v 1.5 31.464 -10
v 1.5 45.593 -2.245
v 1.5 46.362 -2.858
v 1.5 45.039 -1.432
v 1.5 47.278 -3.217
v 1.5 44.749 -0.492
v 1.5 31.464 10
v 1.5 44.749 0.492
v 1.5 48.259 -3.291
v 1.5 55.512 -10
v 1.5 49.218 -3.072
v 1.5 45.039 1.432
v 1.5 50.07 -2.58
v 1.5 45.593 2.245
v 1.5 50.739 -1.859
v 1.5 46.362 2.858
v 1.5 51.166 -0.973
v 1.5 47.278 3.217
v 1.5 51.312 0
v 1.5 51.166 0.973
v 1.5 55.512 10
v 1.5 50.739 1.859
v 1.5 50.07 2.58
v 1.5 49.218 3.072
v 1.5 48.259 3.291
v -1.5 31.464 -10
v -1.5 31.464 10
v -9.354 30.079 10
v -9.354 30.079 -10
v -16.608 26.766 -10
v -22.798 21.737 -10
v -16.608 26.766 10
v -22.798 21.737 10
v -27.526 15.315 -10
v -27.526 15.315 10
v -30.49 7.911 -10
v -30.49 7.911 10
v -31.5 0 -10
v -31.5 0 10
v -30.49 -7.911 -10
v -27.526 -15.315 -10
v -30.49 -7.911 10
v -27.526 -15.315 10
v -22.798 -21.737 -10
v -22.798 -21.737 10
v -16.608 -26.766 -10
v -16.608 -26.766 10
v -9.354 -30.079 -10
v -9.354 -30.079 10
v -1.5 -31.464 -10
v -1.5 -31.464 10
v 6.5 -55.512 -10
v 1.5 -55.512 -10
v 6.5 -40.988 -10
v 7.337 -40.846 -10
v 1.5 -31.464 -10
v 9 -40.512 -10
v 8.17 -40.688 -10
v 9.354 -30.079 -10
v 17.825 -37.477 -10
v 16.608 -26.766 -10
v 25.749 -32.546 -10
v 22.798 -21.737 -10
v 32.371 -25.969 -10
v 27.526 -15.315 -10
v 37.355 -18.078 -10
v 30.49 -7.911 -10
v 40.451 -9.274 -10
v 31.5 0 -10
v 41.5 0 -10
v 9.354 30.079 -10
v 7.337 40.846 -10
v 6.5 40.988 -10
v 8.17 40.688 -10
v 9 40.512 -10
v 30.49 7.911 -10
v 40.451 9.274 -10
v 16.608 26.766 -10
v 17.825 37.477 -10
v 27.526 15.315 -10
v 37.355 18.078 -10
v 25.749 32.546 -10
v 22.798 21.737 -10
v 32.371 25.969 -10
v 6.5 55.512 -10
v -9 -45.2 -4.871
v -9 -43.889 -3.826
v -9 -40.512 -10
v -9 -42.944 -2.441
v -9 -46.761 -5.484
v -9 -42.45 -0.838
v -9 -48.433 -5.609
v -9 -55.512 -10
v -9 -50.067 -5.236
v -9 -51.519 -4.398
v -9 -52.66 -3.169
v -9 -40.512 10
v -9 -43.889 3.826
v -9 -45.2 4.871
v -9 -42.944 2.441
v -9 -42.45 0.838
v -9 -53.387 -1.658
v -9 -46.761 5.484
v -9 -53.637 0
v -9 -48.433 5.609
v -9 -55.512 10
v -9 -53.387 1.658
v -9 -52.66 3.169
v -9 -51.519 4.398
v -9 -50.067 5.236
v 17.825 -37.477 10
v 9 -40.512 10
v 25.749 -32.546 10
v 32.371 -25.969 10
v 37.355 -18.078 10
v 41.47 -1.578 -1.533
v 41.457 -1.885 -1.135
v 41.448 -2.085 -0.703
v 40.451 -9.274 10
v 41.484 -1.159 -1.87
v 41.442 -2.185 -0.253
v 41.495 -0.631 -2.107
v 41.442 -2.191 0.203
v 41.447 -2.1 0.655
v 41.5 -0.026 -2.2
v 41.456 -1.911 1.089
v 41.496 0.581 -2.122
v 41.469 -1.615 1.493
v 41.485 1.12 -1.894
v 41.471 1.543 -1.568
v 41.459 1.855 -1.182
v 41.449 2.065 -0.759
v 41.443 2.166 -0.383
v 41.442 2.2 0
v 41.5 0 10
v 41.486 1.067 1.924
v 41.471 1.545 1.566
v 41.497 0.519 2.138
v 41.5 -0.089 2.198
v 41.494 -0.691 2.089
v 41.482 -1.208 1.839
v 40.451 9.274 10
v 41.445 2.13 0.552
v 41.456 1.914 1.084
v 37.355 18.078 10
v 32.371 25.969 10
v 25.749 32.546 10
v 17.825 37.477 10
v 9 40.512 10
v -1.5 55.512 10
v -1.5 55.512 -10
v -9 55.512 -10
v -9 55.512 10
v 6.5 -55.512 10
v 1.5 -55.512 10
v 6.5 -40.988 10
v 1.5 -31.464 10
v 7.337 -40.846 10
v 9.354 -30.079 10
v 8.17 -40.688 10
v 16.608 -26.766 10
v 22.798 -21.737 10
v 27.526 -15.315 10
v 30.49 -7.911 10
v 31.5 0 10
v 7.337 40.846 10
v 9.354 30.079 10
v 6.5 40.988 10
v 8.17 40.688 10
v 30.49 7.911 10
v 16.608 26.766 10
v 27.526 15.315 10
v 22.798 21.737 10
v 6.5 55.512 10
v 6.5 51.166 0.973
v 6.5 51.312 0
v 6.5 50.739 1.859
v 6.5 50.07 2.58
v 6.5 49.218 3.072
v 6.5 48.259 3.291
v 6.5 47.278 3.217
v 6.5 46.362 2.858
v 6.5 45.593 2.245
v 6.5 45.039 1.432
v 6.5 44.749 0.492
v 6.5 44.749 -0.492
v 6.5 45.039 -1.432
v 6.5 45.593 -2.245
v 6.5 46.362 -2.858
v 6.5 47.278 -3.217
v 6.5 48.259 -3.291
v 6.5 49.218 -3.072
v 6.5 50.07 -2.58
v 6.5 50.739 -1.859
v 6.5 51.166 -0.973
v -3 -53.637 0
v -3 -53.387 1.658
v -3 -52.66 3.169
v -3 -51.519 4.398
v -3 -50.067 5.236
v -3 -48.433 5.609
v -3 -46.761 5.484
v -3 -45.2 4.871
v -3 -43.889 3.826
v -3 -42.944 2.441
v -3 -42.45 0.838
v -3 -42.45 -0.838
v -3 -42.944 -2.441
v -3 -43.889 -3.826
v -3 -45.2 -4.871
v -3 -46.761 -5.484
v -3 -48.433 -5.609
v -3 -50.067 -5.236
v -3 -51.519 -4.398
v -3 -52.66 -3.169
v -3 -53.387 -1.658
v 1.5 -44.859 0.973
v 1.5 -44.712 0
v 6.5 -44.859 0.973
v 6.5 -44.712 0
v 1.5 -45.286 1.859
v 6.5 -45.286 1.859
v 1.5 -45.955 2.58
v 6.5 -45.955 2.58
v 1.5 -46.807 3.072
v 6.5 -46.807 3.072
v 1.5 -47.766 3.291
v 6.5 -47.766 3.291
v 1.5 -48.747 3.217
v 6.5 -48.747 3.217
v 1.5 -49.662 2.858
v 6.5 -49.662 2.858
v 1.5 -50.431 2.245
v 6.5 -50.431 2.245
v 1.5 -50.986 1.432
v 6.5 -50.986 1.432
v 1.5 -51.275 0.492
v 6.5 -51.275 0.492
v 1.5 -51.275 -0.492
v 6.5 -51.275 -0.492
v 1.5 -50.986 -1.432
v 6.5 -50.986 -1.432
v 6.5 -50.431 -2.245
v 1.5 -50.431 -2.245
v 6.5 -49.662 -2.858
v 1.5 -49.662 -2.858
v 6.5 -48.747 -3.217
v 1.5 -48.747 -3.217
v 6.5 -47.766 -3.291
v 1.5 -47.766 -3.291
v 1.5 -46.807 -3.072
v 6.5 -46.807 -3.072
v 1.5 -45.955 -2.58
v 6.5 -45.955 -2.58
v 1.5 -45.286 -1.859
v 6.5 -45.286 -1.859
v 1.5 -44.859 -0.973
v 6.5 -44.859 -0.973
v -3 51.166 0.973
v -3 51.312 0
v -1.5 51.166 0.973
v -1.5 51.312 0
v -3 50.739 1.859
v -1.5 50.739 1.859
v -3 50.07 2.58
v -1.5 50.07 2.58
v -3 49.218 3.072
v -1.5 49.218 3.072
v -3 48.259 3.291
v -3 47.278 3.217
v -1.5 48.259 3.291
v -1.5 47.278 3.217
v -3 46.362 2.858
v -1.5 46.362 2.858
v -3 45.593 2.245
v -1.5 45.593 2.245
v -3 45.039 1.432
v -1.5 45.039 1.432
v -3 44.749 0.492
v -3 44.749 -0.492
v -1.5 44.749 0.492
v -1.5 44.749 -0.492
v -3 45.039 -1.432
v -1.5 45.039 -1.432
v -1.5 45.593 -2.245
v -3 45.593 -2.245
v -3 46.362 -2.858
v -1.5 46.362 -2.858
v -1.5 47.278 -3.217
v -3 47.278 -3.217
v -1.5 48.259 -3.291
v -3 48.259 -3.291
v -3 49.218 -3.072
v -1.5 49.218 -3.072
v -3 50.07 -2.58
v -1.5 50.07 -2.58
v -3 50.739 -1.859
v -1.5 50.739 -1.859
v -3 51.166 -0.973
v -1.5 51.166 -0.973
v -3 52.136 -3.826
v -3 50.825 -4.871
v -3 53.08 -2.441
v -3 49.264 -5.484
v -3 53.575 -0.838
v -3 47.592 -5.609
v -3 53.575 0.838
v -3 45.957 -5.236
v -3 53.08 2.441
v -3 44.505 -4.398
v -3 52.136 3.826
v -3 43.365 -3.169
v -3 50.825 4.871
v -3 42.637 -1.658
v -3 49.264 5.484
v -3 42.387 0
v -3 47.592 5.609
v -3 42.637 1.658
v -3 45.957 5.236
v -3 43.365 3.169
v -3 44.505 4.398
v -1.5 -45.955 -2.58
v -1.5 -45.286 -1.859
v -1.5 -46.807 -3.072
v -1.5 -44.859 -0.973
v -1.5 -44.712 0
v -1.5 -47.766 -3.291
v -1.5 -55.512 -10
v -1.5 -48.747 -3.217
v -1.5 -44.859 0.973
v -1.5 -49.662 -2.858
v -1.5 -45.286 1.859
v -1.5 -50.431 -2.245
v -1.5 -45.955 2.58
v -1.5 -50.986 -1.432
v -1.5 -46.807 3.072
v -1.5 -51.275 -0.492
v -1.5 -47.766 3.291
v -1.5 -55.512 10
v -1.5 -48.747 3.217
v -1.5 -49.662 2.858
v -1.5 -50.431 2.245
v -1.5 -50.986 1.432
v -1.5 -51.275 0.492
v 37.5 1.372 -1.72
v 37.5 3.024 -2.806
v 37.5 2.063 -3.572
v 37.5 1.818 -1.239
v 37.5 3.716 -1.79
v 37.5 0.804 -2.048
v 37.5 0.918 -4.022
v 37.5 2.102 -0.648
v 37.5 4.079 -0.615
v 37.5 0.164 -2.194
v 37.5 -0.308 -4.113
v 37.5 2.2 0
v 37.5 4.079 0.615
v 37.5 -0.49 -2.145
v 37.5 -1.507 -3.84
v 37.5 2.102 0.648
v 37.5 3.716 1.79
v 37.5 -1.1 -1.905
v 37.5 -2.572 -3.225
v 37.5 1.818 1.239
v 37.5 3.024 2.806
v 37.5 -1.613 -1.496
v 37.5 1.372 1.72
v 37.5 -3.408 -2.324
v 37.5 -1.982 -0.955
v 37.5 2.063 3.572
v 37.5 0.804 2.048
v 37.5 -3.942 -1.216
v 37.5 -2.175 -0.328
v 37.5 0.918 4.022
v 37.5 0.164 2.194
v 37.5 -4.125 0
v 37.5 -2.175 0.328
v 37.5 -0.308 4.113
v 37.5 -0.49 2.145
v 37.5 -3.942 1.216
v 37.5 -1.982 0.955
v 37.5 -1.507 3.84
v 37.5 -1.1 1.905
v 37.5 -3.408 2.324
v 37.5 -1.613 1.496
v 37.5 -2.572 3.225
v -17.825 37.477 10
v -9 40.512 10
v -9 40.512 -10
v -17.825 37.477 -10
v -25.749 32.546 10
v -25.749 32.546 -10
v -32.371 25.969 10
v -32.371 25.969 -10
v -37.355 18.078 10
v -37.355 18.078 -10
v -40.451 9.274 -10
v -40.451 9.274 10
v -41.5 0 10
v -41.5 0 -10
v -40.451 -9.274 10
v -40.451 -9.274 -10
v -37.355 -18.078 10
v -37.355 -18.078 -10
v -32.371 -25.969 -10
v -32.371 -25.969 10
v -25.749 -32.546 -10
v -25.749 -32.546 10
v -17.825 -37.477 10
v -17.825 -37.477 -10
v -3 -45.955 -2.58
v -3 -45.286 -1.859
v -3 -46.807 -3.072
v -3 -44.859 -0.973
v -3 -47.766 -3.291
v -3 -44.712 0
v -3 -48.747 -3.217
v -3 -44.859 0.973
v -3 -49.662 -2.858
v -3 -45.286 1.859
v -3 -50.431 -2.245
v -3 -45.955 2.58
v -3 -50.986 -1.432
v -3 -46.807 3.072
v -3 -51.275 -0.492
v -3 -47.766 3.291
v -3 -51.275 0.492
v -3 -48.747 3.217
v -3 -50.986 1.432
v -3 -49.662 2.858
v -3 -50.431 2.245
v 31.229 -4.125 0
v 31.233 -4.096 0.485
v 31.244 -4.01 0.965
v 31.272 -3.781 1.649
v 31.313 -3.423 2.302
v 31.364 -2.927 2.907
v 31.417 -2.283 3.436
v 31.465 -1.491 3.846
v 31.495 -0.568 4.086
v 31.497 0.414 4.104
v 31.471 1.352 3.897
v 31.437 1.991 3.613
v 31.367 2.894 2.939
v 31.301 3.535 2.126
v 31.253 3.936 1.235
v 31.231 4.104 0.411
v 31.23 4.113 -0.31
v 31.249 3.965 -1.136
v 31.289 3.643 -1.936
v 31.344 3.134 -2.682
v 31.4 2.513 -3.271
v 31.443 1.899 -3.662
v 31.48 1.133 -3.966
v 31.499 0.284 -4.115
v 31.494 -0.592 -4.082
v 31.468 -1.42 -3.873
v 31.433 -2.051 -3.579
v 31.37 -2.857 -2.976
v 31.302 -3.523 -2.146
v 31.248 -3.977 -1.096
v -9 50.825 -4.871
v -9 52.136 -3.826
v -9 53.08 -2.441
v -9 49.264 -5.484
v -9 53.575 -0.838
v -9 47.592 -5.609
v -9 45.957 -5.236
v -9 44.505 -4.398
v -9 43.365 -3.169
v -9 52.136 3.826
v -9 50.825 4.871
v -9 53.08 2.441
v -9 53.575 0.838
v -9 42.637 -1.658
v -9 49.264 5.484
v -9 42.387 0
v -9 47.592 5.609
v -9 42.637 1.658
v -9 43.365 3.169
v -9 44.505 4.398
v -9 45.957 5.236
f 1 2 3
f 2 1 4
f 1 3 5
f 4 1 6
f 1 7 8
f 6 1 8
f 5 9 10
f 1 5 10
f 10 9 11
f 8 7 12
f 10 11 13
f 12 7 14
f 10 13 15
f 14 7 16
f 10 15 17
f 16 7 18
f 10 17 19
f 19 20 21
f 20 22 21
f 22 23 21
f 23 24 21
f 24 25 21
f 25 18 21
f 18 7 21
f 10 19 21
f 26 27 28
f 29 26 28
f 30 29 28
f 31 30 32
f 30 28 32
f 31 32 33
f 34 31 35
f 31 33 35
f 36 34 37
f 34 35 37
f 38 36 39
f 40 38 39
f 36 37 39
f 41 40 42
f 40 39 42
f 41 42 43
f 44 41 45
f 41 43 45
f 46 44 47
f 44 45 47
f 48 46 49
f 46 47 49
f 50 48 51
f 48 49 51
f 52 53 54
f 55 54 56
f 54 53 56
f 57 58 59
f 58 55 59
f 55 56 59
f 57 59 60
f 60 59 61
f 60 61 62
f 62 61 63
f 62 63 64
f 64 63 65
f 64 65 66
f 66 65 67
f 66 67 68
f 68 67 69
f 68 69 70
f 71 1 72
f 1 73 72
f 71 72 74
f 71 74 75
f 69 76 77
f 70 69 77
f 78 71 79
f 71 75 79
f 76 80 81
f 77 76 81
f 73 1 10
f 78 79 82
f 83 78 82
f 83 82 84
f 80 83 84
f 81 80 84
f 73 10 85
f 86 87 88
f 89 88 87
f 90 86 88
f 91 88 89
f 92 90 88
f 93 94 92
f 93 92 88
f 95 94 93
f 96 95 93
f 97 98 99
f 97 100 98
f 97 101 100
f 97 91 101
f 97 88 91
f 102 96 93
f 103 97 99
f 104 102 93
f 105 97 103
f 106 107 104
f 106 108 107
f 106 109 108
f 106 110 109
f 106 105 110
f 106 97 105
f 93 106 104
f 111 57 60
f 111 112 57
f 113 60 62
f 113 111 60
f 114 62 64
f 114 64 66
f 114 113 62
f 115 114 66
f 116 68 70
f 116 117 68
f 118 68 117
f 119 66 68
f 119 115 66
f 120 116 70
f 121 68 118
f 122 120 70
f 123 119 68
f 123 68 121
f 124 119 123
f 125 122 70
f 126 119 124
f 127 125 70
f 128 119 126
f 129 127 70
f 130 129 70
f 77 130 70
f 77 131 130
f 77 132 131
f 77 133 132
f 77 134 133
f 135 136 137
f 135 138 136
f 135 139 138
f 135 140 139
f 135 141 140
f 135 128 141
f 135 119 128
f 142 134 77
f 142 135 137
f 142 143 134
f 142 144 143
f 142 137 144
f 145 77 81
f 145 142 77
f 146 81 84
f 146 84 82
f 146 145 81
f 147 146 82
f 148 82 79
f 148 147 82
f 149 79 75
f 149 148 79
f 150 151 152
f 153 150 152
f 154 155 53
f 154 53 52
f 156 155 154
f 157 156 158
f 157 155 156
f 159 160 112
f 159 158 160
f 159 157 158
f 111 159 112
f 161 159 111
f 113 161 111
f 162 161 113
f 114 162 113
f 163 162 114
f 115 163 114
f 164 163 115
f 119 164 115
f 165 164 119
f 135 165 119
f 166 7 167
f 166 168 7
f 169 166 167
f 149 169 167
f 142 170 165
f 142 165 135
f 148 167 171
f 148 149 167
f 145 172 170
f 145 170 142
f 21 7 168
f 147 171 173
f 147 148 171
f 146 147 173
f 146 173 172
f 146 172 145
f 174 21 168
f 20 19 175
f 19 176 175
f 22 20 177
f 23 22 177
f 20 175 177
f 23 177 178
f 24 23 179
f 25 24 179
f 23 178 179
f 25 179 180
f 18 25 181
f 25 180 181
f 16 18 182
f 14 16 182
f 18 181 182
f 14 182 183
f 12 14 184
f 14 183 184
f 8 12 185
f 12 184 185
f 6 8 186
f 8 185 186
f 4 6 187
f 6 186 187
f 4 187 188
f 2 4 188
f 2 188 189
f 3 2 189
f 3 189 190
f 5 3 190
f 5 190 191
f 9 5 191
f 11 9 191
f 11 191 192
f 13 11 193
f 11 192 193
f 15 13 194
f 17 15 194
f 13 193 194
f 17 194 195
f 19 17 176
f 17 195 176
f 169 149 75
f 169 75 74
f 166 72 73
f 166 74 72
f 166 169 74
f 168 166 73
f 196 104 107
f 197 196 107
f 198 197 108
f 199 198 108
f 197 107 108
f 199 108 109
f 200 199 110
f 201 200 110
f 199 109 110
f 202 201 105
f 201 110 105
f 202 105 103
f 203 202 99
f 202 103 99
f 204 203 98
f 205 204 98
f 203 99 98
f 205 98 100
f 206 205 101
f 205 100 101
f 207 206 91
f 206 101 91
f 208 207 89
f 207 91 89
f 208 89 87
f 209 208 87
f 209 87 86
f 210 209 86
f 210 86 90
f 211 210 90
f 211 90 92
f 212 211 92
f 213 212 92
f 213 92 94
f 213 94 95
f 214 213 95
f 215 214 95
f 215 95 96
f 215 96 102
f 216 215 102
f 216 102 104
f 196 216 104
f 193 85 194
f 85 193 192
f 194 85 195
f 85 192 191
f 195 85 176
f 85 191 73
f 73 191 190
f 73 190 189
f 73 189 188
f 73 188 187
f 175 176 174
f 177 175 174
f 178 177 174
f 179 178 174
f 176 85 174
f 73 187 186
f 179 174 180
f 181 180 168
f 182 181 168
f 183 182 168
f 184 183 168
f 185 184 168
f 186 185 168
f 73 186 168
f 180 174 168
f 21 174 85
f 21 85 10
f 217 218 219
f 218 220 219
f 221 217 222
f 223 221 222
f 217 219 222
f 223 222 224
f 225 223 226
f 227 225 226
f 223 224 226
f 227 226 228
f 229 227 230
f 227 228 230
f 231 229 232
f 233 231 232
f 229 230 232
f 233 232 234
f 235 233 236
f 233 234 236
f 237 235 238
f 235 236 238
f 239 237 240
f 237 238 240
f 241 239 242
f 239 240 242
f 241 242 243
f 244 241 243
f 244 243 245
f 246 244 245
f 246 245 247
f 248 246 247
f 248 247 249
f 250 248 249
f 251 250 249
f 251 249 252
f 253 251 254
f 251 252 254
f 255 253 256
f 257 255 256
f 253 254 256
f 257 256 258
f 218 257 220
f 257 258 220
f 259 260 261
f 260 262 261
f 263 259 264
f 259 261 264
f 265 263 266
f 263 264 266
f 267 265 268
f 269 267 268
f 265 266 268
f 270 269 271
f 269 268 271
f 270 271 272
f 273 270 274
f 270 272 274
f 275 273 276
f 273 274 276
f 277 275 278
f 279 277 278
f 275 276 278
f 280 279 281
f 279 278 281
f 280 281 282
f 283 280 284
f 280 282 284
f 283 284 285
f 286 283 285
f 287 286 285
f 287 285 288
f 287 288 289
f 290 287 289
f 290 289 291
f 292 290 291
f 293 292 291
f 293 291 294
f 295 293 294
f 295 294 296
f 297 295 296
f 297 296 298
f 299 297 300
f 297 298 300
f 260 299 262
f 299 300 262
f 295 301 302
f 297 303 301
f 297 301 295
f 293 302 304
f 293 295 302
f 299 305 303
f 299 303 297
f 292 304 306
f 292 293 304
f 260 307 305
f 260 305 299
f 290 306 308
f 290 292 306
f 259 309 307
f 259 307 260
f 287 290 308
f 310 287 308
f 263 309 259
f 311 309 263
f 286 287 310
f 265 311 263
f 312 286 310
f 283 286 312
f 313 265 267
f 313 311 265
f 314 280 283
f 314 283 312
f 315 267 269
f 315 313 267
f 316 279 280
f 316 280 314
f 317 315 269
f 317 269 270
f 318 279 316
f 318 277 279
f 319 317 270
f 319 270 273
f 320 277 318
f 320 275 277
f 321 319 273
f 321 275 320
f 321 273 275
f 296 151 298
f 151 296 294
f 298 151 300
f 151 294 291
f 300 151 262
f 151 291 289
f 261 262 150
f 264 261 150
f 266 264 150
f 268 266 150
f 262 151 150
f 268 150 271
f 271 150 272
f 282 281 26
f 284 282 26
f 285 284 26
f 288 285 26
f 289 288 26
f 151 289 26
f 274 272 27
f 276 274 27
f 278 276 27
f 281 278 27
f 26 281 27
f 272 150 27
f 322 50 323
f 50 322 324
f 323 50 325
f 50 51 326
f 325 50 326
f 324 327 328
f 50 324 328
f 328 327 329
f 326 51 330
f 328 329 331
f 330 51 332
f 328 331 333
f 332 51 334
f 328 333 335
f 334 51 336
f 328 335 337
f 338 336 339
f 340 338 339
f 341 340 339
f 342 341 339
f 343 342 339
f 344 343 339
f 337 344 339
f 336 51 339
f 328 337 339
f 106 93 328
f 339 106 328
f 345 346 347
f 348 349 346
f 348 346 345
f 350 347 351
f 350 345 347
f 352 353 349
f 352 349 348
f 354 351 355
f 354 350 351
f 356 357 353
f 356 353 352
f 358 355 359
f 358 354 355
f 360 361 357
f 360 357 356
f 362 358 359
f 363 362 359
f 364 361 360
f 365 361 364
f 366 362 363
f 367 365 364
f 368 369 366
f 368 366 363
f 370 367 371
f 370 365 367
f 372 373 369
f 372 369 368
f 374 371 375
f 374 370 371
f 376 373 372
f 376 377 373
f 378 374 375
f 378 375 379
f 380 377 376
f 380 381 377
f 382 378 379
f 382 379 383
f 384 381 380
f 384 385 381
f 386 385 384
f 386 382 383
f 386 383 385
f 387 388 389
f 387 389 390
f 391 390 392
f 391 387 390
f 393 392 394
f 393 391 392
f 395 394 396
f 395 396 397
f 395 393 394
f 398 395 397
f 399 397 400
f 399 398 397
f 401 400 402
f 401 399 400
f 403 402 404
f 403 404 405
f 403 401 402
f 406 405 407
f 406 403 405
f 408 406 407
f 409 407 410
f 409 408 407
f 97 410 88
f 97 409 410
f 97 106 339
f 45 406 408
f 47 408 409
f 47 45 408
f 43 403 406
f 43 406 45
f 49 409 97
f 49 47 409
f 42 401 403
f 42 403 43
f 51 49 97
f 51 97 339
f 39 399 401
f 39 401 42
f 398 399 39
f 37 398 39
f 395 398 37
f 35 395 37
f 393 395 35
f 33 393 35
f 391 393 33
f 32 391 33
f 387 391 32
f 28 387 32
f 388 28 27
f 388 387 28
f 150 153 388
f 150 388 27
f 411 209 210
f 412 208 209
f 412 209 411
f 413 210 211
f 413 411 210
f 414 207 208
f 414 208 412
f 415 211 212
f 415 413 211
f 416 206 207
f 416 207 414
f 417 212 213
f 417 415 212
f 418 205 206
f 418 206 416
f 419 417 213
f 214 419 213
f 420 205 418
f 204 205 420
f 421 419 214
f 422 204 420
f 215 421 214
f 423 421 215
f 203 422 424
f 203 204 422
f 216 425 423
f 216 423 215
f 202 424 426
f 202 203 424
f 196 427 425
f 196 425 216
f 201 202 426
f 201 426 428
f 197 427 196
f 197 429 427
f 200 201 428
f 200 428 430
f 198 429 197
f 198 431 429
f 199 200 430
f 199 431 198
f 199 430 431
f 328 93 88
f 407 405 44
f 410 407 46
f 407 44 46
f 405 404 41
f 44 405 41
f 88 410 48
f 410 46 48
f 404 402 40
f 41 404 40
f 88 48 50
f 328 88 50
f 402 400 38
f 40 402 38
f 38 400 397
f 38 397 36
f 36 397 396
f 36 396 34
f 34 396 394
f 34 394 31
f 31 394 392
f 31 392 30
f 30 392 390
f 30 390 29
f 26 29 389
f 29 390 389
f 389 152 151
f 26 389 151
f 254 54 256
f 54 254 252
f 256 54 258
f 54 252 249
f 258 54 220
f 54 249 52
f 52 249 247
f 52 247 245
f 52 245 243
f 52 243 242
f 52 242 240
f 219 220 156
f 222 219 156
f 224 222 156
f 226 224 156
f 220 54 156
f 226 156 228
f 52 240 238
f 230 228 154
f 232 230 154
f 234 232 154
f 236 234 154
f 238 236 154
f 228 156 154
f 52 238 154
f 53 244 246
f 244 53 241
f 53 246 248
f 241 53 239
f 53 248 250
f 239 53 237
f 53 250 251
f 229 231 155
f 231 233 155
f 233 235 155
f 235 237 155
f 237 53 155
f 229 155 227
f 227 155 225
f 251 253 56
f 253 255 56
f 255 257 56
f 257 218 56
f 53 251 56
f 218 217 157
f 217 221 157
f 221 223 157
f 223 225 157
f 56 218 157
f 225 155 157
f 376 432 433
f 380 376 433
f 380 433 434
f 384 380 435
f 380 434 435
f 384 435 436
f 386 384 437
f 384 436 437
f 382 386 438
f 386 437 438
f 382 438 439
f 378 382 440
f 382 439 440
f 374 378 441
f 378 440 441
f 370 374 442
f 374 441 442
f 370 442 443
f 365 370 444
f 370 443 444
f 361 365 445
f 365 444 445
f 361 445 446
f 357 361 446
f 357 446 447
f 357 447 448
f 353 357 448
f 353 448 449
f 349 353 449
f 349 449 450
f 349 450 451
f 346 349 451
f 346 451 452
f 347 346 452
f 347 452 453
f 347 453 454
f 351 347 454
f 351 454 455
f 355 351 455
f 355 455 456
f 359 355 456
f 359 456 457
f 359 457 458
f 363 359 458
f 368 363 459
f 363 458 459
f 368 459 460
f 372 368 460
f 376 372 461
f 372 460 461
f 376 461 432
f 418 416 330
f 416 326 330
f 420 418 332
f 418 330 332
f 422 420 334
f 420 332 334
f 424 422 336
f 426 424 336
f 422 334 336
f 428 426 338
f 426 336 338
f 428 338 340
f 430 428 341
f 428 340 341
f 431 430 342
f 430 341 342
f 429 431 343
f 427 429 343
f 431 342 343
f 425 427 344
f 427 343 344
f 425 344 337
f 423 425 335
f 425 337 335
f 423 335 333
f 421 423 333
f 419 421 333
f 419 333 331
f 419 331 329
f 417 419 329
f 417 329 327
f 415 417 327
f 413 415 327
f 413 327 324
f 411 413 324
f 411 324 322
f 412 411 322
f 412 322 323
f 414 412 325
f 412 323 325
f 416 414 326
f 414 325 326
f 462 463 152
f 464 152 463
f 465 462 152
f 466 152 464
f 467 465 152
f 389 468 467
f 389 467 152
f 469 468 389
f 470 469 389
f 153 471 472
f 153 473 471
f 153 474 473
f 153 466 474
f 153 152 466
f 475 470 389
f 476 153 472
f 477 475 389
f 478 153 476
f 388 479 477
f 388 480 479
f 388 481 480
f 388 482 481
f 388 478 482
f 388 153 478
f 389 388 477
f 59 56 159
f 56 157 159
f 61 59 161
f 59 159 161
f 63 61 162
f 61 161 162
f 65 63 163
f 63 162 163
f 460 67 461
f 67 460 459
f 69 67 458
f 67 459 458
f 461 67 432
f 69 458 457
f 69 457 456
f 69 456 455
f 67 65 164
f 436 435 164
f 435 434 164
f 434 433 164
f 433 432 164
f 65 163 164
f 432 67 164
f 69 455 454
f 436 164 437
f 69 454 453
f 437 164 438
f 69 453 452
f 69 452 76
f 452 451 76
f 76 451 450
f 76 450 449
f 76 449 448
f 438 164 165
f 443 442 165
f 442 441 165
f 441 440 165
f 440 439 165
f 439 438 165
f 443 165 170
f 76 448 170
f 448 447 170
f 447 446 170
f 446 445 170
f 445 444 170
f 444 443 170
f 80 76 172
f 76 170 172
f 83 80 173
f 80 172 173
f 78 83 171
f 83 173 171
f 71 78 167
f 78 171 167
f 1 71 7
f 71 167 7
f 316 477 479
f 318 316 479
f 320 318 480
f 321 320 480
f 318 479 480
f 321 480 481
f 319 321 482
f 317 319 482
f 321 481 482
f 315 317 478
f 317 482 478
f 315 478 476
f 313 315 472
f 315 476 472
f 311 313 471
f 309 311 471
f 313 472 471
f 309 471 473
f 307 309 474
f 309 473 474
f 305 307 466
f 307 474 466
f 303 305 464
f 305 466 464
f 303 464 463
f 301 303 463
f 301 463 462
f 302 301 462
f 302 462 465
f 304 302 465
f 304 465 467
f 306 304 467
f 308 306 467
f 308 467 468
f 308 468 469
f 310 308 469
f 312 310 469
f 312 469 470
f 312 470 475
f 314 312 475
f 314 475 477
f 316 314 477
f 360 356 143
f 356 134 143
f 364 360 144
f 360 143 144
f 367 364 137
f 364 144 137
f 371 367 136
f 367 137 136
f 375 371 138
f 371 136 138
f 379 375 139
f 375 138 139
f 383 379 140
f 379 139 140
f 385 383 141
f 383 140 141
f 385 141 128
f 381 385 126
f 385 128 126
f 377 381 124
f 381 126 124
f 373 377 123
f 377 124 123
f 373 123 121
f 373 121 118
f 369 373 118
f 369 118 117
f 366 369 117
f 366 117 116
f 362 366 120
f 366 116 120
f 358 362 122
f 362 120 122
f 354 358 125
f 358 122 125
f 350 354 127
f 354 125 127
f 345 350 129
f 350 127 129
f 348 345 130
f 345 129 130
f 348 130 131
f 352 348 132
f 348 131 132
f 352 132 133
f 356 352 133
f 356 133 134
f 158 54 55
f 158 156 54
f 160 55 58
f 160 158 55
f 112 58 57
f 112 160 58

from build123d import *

# Parameters (mm, degrees)
F0_R                 = 31.5
F1_DEPTH             = 10
F1_DEPTH_BACK        = 10
F3_DEPTH             = 20
F6_D                 = 6.6
F6_CBORE_D           = 11.25
F6_CBORE_DEPTH       = 6
F6_ON_F5_D           = 6.6
F6_ON_F5_CBORE_D     = 11.25
F6_ON_F5_CBORE_DEPTH = 6
F11_D                = 4.4
F11_DEPTH            = 14.25
F11_START            = 2.0000001
F11_CBORE_D          = 8.25
F11_CBORE_DEPTH      = 6
F11_TIP              = 1.3218933619


# Not quite as in the source:
# - a feature names something its author has since deleted; it is built from what else it names


with BuildPart() as f1:
    # F0 (on Top) → F1 (new body, two sides)
    with BuildSketch(Plane.XY) as f1_sk:
        with BuildLine():
            ThreePointArc((9, -40.5123437979), (32.3708974235, -25.9687311973), (41.5, 0))
            ThreePointArc((41.5, 0), (32.3708974235, 25.9687311973), (9, 40.5123437979))
            Line((9, 40.5123437979), (-9, 40.5123437979))
            ThreePointArc((-9, 40.5123437979), (-41.5, 0), (-9, -40.5123437979))
            Line((-9, -40.5123437979), (9, -40.5123437979))
        make_face()
        Circle(F0_R, mode=Mode.SUBTRACT)
        with BuildLine():
            ThreePointArc((-9, 40.5123437979), (0, 41.5), (9, 40.5123437979))
            Line((9, 40.5123437979), (9, 55.5123437979))
            Line((9, 55.5123437979), (-9, 55.5123437979))
            Line((-9, 55.5123437979), (-9, 40.5123437979))
        make_face()
        with BuildLine():
            Line((9, -55.5123437979), (9, -40.5123437979))
            ThreePointArc((9, -40.5123437979), (0, -41.5), (-9, -40.5123437979))
            Line((-9, -40.5123437979), (-9, -55.5123437979))
            Line((-9, -55.5123437979), (9, -55.5123437979))
        make_face()
        with BuildLine():
            ThreePointArc((-9, -40.5123437979), (0, -41.5), (9, -40.5123437979))
            Line((9, -40.5123437979), (-9, -40.5123437979))
        make_face()
        with BuildLine():
            Line((-9, 40.5123437979), (9, 40.5123437979))
            ThreePointArc((9, 40.5123437979), (0, 41.5), (-9, 40.5123437979))
        make_face()
    extrude(amount=F1_DEPTH)
    extrude(f1_sk.sketch, amount=-F1_DEPTH_BACK)

    # F2 (on face) → F3 (cut, through all)
    with BuildSketch(Plane.XY.offset(10)):
        with BuildLine():
            ThreePointArc((1.5, -41.4728827067), (0, -41.5), (-1.5, -41.4728827067))
            Line((-1.5, -41.4728827067), (-1.5, -55.5123437979))
            Line((-1.5, -55.5123437979), (1.5, -55.5123437979))
            Line((1.5, -55.5123437979), (1.5, -41.4728827067))
        make_face()
        with BuildLine():
            ThreePointArc((1.5, -31.4642654451), (0, -31.5), (-1.5, -31.4642654451))
            Line((-1.5, -31.4642654451), (-1.5, -41.4728827067))
            ThreePointArc((-1.5, -41.4728827067), (0, -41.5), (1.5, -41.4728827067))
            Line((1.5, -41.4728827067), (1.5, -31.4642654451))
        make_face()
        with BuildLine():
            Line((9, -55.5123437979), (9, -40.5123437979))
            ThreePointArc((9, -40.5123437979), (7.7536452961, -40.7692406677), (6.5, -40.9878030638))
            Line((6.5, -40.9878030638), (6.5, -55.5123437979))
            Line((6.5, -55.5123437979), (9, -55.5123437979))
        make_face()
        with BuildLine():
            Line((1.5, 55.5123437979), (-1.5, 55.5123437979))
            Line((-1.5, 55.5123437979), (-1.5, 41.4728827067))
            ThreePointArc((-1.5, 41.4728827067), (0, 41.5), (1.5, 41.4728827067))
            Line((1.5, 41.4728827067), (1.5, 55.5123437979))
        make_face()
        with BuildLine():
            ThreePointArc((1.5, 41.4728827067), (0, 41.5), (-1.5, 41.4728827067))
            Line((-1.5, 41.4728827067), (-1.5, 31.4642654451))
            ThreePointArc((-1.5, 31.4642654451), (0, 31.5), (1.5, 31.4642654451))
            Line((1.5, 31.4642654451), (1.5, 41.4728827067))
        make_face()
        with BuildLine():
            Line((9, 55.5123437979), (6.5, 55.5123437979))
            Line((6.5, 55.5123437979), (6.5, 40.9878030638))
            ThreePointArc((6.5, 40.9878030638), (7.7536452961, 40.7692406677), (9, 40.5123437979))
            Line((9, 40.5123437979), (9, 55.5123437979))
        make_face()
    extrude(amount=-F3_DEPTH, mode=Mode.SUBTRACT)

    # F6 (through all)
    with Locations(Plane(origin=(-9, 0, 0), x_dir=(0, -1, 0), z_dir=(-1, 0, 0))):
        with Locations((-48.0123437979, 0)):
            CounterBoreHole(F6_D / 2, F6_CBORE_D / 2, F6_CBORE_DEPTH)

    # F6 on F5 (through all)
    with Locations(Plane(origin=(-9, 0, 0), x_dir=(0, -1, 0), z_dir=(-1, 0, 0))):
        with Locations((48.0123437979, 0)):
            CounterBoreHole(F6_ON_F5_D / 2, F6_ON_F5_CBORE_D / 2, F6_ON_F5_CBORE_DEPTH)

    # F11
    # its depths count from where the whole tool has entered the part; down to there all is cleared
    with Locations(Plane(origin=(29.5, 0, 0), x_dir=(0, -1, 0), z_dir=(-1, 0, 0)).offset(-F11_START)):
        with Locations((0, 0)):
            CounterBoreHole(F11_D / 2, F11_CBORE_D / 2, F11_CBORE_DEPTH, depth=F11_DEPTH)
            with Locations((0, 0, -(F11_DEPTH + F11_TIP / 2))):  # 118° drill point
                Cone(0, F11_D / 2, F11_TIP, mode=Mode.SUBTRACT)


solid = f1.part
